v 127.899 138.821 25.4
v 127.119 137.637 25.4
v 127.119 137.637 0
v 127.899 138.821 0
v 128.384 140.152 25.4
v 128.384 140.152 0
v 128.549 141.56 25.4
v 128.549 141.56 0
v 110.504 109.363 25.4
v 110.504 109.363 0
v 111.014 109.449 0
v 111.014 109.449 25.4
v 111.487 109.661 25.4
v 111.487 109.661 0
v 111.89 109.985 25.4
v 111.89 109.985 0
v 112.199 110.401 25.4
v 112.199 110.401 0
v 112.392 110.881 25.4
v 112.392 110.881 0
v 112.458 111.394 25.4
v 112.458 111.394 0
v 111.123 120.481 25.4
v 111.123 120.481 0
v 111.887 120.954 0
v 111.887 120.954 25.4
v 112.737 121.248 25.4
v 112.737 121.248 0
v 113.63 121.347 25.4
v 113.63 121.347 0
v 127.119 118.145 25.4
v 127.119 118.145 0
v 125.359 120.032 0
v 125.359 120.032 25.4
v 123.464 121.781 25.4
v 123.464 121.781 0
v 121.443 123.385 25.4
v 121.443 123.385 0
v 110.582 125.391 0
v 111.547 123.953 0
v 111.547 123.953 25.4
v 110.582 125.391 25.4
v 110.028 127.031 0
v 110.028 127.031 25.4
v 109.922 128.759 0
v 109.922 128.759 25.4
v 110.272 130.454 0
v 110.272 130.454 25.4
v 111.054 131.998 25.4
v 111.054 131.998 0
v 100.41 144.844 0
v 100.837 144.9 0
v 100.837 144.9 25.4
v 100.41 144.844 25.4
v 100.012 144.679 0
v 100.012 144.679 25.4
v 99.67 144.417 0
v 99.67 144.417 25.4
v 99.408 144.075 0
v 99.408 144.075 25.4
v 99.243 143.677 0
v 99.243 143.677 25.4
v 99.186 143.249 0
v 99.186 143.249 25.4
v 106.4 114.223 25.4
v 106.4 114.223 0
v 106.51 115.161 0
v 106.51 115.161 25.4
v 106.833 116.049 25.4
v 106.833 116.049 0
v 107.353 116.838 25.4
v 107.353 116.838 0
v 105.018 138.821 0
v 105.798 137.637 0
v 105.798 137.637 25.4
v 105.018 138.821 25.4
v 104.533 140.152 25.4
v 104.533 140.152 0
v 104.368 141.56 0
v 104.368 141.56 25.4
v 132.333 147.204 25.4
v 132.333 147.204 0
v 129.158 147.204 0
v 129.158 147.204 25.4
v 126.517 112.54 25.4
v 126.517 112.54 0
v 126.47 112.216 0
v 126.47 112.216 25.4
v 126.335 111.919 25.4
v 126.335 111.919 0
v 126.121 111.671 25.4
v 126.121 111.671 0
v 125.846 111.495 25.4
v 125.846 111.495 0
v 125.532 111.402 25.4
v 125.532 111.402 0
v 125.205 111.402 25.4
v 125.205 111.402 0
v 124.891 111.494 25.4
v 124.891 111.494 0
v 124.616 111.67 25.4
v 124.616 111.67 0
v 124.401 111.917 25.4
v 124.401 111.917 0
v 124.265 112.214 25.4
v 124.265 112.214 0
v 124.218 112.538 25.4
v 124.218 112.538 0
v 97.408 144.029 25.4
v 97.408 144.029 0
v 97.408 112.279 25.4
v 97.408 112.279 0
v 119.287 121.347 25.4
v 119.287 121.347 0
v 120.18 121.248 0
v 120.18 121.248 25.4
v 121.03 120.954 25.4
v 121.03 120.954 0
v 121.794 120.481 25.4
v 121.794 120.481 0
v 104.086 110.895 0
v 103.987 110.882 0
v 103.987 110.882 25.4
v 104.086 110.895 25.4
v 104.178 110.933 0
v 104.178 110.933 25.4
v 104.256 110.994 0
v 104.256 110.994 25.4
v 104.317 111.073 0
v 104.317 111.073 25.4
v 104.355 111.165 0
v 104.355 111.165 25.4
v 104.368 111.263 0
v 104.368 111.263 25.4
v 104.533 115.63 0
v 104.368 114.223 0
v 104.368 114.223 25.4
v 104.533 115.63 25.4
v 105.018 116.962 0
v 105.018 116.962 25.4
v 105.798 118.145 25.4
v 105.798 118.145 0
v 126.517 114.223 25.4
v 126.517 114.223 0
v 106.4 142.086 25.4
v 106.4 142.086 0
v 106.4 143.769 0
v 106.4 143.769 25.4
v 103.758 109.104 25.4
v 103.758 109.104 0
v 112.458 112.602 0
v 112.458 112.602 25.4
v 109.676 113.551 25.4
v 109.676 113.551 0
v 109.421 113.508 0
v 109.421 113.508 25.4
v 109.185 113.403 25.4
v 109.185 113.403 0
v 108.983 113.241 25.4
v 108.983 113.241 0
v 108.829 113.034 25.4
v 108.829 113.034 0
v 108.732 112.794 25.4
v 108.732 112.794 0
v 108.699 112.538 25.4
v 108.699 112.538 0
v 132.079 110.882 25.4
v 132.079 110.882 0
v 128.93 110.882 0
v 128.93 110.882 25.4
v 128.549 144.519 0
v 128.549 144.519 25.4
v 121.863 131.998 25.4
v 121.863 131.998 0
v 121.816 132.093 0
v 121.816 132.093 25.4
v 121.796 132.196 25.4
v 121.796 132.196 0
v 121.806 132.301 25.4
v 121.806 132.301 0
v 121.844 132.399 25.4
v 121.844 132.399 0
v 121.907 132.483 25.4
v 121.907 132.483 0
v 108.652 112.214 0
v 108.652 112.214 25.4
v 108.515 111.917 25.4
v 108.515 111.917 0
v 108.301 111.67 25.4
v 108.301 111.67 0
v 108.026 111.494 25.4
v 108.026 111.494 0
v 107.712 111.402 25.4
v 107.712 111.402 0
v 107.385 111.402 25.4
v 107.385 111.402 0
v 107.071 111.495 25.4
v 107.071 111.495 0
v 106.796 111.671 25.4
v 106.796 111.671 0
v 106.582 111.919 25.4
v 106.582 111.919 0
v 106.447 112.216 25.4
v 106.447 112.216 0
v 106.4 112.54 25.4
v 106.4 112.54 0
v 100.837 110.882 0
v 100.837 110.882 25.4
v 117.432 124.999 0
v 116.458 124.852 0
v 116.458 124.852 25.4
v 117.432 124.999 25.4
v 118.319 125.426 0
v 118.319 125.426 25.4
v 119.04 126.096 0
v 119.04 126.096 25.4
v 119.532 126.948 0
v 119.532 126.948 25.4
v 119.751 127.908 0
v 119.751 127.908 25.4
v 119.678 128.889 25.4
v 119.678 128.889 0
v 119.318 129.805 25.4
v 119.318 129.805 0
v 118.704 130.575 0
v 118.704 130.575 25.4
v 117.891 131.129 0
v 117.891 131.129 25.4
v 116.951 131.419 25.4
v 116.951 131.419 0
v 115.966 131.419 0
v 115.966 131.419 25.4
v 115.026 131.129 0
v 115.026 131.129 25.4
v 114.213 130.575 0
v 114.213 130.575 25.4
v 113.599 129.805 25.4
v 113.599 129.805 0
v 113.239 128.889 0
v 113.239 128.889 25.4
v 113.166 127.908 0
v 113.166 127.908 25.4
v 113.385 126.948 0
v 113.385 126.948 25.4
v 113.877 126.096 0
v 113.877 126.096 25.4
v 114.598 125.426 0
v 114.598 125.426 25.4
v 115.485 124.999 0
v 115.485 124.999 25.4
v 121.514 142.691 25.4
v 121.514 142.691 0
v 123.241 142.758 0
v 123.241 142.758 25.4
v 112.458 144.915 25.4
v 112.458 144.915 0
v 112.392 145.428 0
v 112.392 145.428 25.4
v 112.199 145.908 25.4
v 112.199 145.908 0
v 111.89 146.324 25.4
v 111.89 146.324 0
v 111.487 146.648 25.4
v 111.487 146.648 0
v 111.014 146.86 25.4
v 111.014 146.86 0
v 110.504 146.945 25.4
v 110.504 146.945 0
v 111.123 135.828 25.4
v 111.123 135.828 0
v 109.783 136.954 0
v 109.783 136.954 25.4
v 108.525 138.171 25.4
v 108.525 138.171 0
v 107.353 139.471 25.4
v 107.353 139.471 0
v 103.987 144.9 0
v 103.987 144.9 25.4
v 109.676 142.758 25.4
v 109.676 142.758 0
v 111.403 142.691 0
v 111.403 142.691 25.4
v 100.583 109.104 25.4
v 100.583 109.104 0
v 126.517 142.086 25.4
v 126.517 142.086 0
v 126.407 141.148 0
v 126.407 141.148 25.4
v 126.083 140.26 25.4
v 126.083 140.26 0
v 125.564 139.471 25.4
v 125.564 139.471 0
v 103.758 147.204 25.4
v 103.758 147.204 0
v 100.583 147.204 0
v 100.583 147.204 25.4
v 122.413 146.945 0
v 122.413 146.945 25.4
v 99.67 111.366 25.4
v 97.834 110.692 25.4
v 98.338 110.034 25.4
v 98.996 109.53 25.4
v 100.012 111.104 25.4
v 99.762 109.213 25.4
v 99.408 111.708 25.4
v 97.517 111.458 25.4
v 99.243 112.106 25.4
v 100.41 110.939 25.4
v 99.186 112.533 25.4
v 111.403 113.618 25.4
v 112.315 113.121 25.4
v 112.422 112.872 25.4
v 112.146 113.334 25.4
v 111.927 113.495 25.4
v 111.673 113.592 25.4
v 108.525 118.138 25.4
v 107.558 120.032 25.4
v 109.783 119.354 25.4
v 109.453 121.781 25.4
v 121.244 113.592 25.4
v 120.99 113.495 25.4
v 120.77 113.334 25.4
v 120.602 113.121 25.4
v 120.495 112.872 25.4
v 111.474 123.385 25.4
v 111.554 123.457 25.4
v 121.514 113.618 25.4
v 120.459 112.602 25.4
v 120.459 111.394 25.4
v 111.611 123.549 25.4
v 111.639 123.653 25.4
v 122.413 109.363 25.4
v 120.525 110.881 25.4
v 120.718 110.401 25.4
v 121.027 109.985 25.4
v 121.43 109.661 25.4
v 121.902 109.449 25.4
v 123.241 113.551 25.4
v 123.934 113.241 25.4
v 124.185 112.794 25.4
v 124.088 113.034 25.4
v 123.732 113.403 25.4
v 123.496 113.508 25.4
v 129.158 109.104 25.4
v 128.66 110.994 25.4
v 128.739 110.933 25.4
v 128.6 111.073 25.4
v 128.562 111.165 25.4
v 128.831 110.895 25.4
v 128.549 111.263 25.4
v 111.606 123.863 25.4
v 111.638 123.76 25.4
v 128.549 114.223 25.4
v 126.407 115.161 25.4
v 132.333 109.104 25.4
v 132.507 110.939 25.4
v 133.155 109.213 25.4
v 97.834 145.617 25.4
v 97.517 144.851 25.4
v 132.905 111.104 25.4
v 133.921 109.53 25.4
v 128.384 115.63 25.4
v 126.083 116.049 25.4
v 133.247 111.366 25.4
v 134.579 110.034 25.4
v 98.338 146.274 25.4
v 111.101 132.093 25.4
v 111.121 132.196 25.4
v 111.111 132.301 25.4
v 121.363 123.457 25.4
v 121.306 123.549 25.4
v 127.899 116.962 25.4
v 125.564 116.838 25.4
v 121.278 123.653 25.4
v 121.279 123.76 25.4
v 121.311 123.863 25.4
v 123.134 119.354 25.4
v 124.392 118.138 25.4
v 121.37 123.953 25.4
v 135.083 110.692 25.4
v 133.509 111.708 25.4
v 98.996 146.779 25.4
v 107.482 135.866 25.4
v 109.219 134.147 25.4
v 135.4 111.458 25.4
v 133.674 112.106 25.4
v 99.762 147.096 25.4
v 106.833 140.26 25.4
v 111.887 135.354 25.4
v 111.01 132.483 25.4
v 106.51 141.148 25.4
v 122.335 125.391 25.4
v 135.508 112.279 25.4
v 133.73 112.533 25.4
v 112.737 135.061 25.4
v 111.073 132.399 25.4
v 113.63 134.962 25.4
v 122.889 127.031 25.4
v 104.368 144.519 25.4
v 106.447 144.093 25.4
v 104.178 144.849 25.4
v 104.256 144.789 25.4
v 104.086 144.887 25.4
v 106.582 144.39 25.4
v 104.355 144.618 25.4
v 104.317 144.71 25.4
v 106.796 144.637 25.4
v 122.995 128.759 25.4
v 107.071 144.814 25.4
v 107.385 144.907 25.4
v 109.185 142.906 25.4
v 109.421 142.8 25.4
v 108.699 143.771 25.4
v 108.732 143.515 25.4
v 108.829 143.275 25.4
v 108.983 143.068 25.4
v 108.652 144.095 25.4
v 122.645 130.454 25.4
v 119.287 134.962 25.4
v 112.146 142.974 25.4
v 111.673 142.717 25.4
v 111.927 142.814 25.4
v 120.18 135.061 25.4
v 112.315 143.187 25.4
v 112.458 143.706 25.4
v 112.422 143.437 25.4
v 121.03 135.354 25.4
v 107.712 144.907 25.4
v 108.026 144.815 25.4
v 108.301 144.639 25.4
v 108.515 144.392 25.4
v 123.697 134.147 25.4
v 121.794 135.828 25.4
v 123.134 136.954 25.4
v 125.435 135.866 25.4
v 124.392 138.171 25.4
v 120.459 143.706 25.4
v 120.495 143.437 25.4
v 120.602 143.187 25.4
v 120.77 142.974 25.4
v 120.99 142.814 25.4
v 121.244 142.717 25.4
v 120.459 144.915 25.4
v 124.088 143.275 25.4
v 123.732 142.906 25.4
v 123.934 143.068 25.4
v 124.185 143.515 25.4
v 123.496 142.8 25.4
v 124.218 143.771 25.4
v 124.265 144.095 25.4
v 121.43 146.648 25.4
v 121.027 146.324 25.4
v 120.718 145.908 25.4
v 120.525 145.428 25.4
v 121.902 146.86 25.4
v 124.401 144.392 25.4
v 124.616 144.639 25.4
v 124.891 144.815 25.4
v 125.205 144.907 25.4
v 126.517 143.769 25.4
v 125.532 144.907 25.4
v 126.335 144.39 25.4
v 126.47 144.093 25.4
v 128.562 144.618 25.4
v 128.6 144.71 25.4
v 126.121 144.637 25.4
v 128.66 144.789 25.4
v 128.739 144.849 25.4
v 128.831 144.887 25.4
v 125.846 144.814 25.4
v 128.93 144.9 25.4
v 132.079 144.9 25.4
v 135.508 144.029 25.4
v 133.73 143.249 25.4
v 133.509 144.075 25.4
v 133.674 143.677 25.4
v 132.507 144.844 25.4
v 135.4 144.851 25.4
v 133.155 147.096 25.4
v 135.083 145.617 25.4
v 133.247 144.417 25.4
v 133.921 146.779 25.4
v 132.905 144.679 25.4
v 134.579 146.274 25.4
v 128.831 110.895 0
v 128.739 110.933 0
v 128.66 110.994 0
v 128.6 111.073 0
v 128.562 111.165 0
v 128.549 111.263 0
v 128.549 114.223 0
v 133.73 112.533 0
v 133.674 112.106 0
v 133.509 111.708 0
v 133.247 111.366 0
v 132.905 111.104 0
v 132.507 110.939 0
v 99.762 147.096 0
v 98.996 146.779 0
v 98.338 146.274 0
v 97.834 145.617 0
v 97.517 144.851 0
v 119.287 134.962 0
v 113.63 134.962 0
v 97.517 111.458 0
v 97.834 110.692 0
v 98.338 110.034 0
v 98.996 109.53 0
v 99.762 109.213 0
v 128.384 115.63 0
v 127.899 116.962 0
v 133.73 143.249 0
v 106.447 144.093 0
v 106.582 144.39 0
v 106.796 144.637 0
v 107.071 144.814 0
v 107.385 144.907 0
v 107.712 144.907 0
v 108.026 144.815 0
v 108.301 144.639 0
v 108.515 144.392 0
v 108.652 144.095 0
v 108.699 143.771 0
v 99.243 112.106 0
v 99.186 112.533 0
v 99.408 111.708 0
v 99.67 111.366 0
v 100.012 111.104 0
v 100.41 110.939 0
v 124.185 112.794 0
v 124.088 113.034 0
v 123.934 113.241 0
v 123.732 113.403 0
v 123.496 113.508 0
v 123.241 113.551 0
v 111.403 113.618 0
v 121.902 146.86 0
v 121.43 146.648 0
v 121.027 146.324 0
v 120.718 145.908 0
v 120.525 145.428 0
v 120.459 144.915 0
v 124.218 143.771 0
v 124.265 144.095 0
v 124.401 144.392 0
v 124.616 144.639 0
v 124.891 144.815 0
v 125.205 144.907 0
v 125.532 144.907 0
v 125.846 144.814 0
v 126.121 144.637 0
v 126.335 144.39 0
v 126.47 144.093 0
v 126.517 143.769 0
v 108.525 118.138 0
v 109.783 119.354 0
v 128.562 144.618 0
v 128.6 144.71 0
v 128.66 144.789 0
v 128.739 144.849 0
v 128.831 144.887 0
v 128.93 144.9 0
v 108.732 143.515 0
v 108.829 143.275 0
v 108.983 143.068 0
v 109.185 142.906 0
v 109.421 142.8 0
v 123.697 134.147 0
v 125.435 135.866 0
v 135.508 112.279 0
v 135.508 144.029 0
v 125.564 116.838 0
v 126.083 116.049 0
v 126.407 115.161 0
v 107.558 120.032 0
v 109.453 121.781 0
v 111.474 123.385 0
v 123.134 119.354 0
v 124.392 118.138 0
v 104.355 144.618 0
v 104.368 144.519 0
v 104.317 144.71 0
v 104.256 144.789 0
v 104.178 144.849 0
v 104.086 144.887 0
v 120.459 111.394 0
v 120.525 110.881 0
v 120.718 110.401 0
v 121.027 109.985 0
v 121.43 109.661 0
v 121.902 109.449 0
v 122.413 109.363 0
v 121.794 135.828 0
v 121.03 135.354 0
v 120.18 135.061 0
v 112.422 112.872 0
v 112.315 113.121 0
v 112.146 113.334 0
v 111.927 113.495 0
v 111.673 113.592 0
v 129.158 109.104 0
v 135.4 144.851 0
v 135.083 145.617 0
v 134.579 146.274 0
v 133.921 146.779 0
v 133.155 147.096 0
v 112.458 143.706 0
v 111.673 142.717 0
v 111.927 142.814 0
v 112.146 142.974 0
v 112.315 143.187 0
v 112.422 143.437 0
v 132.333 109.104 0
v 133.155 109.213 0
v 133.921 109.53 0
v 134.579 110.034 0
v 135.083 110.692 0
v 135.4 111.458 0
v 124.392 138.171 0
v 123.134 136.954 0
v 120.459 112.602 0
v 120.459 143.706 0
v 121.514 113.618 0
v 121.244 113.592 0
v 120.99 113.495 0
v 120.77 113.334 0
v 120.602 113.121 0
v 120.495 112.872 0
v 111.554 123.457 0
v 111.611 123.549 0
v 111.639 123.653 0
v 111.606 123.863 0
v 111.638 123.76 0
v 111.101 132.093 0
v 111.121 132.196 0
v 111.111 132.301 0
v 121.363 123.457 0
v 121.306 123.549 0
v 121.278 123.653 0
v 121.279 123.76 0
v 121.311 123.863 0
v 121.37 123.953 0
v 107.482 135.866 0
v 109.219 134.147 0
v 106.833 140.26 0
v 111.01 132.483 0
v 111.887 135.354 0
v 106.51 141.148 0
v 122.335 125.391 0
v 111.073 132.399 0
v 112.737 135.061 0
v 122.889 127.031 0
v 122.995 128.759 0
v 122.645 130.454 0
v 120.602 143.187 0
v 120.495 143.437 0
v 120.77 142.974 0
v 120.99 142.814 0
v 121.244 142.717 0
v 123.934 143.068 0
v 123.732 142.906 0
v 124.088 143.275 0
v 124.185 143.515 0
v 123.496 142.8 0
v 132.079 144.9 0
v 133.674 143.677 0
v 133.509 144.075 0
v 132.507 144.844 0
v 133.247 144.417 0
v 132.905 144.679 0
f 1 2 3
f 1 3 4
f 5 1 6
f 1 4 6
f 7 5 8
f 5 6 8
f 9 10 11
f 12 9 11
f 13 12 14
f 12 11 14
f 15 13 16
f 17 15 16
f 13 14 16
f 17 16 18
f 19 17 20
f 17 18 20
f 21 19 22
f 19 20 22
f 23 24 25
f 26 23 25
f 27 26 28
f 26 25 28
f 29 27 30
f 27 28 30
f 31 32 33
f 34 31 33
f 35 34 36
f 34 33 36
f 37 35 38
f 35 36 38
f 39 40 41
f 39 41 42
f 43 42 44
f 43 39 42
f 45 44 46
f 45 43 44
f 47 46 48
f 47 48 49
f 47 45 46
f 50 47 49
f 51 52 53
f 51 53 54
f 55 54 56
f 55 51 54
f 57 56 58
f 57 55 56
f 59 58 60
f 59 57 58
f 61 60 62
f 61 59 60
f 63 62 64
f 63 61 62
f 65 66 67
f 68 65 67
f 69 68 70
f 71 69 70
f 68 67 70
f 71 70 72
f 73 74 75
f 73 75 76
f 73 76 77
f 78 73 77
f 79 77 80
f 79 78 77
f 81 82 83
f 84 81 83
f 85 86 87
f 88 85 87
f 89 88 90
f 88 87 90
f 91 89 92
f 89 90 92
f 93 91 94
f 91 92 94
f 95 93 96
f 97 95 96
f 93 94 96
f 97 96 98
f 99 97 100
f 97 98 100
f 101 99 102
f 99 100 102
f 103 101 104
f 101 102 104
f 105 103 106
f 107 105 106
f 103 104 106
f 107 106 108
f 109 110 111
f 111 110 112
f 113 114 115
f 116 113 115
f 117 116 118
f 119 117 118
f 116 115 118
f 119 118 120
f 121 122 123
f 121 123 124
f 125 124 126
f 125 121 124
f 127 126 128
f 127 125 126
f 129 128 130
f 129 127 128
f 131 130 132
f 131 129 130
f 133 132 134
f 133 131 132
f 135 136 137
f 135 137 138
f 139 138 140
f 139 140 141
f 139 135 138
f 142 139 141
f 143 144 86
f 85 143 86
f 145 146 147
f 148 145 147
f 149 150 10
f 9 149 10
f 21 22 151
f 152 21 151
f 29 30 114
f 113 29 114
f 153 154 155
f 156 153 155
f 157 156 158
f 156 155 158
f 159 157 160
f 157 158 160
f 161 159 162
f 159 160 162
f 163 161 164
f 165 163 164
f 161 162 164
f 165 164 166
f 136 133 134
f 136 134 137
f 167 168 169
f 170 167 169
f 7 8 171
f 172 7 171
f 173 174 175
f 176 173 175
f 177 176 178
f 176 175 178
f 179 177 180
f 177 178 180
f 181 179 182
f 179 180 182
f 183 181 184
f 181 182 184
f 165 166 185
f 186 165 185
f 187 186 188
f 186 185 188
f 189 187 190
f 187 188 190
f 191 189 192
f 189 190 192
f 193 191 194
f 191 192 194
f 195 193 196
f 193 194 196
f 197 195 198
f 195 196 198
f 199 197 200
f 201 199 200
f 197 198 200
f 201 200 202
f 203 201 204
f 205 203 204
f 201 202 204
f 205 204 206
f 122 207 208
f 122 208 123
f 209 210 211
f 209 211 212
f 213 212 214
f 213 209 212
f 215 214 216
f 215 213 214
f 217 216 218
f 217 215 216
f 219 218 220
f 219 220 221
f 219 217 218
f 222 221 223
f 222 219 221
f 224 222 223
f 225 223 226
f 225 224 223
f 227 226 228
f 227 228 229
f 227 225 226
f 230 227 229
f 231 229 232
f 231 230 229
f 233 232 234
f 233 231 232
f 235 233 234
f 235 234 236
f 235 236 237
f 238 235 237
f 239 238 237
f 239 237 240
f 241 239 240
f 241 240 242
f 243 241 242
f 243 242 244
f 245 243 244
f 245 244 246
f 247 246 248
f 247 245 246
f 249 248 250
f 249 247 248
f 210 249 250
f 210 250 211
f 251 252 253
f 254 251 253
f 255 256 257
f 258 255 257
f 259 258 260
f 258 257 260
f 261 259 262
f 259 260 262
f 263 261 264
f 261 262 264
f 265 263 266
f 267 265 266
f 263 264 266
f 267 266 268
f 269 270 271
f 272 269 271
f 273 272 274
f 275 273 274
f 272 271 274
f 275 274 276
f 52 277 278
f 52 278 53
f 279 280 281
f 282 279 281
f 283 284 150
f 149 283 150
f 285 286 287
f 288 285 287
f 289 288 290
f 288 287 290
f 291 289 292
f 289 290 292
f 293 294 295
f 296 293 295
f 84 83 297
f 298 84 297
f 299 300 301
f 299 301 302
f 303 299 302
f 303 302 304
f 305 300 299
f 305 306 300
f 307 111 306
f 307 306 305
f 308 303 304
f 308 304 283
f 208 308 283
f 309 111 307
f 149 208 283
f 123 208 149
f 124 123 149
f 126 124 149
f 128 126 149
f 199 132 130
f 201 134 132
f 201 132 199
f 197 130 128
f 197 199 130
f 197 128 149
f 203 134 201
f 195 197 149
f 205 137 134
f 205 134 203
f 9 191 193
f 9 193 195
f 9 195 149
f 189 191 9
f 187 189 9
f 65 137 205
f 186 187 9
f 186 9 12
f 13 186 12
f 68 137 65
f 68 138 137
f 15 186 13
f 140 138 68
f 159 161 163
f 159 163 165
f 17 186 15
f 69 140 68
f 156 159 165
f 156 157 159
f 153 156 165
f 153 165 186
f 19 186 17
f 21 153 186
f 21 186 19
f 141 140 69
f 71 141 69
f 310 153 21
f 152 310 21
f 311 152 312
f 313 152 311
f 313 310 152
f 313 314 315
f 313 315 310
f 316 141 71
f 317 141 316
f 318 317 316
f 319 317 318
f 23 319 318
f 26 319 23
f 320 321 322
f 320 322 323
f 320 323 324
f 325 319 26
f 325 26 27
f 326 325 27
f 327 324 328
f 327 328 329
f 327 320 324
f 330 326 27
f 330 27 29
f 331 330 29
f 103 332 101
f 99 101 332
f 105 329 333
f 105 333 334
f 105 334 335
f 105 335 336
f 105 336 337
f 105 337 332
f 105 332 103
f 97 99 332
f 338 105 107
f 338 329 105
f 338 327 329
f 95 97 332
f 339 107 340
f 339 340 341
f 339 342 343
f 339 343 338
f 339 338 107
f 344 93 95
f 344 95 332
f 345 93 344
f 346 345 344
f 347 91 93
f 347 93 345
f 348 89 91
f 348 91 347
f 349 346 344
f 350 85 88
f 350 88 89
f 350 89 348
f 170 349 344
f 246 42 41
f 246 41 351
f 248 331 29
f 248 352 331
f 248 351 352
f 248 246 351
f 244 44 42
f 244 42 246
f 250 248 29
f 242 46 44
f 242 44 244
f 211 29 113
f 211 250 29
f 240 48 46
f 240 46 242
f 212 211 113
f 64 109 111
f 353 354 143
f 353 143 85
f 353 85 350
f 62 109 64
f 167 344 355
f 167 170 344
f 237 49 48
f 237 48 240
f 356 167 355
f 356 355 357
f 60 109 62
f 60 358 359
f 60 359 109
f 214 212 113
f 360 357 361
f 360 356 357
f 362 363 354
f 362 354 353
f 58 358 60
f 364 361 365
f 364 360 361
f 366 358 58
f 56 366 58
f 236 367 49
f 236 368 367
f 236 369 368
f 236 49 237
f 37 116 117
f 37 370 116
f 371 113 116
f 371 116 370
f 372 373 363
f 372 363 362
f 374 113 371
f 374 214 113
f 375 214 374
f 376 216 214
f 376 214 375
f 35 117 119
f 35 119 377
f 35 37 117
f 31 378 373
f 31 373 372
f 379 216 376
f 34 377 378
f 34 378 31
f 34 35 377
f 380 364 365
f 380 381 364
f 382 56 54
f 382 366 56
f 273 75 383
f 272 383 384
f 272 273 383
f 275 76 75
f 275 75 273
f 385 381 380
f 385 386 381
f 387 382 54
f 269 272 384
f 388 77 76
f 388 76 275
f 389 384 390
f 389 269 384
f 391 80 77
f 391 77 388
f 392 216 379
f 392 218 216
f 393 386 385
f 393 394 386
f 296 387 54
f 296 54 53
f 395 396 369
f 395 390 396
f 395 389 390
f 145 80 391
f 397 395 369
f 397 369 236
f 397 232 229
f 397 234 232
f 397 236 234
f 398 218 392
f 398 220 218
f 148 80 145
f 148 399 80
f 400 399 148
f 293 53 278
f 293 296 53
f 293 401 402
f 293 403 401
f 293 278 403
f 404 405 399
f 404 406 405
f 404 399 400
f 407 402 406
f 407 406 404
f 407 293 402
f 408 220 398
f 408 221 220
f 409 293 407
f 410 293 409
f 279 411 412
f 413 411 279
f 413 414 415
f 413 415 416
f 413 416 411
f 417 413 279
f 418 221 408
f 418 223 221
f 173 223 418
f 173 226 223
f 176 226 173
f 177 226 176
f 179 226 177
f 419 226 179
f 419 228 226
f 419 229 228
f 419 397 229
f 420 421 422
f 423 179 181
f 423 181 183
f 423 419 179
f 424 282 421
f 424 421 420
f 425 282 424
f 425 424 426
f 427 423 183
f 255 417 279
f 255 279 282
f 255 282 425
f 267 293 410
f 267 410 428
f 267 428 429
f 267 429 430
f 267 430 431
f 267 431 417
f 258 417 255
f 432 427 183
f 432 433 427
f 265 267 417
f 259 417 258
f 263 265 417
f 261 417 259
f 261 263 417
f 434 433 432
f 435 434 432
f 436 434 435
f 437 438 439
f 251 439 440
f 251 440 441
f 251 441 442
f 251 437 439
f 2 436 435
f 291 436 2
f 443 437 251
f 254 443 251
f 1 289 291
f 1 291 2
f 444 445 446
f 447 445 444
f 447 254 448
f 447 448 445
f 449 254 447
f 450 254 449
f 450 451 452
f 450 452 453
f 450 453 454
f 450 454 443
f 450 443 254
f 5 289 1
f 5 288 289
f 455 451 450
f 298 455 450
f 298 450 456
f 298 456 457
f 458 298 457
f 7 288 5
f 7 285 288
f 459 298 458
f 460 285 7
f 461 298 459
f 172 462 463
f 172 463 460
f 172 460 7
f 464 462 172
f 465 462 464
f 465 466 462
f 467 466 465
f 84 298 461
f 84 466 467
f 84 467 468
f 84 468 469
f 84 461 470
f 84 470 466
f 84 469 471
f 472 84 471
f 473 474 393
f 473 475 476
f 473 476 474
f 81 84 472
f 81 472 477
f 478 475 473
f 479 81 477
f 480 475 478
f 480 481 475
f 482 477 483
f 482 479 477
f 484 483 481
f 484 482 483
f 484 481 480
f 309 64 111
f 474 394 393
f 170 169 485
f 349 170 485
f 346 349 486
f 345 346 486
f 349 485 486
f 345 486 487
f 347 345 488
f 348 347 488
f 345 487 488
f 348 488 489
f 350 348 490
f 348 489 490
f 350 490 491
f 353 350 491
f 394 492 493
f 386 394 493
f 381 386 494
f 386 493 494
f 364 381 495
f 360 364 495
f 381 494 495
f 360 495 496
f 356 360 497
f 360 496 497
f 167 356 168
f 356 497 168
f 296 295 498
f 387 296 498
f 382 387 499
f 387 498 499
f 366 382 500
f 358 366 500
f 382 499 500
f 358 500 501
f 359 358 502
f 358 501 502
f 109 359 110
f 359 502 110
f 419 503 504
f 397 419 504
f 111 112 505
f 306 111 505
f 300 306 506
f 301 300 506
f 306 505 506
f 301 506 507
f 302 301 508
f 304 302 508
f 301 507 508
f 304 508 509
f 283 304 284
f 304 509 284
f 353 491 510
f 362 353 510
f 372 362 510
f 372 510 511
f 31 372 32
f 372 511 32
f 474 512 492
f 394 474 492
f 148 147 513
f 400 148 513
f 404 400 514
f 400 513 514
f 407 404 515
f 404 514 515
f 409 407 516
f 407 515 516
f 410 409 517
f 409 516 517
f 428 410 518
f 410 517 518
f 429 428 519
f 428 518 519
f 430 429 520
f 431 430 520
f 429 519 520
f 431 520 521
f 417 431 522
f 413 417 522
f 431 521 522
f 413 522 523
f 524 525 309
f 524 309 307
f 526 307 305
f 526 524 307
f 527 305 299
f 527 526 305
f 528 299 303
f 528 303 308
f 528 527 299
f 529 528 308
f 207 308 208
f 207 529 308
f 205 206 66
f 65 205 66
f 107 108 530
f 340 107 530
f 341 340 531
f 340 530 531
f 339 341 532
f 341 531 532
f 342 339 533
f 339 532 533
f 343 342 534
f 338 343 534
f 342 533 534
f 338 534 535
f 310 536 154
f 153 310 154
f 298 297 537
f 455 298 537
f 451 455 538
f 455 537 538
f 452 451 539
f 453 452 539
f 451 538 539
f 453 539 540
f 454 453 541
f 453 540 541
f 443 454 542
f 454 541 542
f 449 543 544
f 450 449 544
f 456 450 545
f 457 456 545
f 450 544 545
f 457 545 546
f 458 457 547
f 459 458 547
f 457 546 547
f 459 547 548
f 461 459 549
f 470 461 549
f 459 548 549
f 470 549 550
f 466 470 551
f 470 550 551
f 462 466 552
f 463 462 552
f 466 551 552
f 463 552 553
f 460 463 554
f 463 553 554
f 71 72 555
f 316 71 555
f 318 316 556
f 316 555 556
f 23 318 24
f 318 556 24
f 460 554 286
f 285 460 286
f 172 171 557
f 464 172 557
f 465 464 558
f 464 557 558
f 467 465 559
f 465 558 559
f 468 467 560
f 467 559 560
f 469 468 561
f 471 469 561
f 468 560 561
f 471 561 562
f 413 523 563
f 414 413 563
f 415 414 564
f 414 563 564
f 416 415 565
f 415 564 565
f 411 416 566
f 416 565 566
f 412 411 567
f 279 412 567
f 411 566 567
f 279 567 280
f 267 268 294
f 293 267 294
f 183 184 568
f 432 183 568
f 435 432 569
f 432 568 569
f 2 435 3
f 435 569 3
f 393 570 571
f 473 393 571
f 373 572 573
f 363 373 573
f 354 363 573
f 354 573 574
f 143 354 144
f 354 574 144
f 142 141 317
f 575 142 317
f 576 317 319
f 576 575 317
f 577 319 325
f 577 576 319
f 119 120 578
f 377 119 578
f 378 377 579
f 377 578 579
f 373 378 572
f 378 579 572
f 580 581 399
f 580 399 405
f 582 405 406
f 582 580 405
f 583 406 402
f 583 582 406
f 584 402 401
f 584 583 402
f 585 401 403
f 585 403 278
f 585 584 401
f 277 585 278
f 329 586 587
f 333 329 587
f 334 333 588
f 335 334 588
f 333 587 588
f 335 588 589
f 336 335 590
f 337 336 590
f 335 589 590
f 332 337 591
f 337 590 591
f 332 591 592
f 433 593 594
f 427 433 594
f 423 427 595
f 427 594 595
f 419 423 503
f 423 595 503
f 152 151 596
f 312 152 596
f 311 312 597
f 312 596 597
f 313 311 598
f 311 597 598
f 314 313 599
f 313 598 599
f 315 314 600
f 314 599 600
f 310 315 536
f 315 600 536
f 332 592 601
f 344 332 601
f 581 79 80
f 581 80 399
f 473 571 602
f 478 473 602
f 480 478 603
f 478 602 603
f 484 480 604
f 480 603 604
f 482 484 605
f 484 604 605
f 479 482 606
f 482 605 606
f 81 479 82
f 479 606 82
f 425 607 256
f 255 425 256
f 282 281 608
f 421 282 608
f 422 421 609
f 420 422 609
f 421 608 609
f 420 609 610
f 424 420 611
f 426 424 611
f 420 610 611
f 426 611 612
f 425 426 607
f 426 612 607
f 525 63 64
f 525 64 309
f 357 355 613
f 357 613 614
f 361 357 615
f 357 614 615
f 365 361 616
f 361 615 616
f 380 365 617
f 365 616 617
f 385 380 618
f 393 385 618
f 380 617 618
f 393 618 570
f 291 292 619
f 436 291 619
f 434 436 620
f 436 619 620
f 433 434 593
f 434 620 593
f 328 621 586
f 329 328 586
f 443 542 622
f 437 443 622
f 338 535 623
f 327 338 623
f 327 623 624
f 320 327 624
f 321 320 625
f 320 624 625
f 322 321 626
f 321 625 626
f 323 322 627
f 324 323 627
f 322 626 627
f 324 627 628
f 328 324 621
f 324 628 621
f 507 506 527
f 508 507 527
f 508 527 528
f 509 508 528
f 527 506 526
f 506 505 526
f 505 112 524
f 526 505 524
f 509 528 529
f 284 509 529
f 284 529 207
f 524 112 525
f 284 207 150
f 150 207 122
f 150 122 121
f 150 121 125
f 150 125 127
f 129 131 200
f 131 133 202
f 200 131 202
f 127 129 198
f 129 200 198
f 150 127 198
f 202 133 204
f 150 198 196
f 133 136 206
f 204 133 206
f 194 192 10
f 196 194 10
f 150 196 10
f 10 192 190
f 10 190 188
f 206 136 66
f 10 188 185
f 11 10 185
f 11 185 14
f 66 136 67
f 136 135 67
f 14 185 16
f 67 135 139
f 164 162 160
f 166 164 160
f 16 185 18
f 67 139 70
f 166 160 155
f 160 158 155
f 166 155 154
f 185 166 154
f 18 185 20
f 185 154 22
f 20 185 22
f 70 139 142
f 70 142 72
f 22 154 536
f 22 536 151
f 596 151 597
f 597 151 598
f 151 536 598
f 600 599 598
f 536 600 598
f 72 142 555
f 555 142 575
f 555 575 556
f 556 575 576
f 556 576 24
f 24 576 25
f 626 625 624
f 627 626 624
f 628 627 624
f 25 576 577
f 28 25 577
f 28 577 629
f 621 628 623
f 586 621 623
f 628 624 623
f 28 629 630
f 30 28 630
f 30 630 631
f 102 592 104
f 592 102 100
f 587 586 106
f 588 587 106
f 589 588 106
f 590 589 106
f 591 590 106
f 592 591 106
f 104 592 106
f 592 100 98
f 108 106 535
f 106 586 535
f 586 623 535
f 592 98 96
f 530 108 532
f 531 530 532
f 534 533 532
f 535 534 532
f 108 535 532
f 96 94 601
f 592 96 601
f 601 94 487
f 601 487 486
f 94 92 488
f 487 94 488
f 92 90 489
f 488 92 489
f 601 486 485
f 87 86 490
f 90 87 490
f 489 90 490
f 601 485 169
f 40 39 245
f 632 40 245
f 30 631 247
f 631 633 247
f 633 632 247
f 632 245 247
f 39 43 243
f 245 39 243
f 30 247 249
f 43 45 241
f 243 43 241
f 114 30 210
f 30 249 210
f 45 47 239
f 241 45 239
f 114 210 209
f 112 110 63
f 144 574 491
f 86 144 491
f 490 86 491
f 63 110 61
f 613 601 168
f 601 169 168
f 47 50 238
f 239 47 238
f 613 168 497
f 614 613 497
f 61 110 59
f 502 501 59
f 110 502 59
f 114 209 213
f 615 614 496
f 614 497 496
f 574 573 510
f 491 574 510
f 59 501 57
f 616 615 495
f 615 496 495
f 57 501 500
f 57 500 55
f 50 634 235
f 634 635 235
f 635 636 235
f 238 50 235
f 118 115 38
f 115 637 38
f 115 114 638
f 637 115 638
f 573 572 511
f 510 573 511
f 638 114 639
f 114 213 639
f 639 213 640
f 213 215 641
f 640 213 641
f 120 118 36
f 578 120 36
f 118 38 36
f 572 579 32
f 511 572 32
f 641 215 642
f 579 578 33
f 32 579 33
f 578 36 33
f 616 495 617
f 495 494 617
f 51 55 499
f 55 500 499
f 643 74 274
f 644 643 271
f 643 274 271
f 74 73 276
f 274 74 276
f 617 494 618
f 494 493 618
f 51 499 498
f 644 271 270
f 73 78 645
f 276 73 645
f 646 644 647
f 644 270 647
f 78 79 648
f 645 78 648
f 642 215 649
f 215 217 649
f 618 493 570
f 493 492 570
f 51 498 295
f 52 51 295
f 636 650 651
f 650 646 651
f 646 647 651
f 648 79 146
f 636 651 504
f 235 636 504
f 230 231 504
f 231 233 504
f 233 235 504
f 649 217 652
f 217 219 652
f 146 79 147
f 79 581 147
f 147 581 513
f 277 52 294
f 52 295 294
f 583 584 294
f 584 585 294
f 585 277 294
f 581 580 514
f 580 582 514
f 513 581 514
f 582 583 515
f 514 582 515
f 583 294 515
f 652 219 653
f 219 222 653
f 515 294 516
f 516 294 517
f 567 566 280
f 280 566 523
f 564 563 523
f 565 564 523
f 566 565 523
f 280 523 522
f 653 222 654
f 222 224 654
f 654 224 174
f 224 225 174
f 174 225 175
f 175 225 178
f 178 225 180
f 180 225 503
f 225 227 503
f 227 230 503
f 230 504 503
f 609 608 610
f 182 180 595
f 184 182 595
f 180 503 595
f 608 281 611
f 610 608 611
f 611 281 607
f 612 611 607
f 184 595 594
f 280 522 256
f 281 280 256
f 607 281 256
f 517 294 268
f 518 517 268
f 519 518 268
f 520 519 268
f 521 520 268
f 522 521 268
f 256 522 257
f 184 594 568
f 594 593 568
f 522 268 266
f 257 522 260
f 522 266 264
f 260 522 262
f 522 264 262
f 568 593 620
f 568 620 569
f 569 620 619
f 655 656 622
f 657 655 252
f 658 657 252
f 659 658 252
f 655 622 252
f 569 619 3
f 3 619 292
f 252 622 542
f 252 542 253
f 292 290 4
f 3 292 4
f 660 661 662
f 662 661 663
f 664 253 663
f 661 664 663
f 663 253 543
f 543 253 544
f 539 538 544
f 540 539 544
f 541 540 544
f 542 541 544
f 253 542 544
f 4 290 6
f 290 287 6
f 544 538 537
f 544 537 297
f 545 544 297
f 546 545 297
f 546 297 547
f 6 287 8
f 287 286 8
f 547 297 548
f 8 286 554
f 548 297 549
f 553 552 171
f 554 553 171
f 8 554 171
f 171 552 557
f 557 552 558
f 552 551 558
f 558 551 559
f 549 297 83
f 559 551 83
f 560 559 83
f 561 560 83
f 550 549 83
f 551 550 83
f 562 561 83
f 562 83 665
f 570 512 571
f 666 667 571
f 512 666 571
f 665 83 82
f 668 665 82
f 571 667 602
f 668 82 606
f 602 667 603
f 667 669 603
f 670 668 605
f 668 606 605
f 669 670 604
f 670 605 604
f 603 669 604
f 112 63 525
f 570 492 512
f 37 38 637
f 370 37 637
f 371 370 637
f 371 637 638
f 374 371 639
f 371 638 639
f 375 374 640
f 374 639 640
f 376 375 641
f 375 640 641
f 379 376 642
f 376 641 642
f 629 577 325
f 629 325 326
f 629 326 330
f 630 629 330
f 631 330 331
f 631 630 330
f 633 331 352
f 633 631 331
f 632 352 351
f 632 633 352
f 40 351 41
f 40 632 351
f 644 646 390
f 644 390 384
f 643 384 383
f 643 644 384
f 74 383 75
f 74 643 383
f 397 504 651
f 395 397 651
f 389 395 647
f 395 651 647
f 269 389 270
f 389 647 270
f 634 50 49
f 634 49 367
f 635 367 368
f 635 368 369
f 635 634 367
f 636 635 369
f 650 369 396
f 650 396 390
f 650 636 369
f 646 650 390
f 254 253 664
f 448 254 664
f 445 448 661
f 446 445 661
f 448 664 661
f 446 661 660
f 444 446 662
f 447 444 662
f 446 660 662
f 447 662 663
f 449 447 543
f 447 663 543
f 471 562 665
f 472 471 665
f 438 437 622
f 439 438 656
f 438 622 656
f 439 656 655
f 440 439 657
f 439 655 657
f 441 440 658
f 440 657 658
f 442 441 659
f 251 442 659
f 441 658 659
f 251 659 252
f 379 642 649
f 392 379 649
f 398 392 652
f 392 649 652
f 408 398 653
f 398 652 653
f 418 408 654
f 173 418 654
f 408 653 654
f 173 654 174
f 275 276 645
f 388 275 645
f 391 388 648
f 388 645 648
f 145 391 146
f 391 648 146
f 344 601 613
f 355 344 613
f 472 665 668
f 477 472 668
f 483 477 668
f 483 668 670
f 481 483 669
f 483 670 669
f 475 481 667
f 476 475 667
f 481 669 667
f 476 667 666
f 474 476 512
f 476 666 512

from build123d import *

# Parameters (mm, degrees)
EXTRUDE1_DEPTH = 25.4


with BuildPart() as part:
    # Sketch1 → Extrude1 (new body)
    with BuildSketch(Plane.XY):
        with BuildLine():
            Line((119.286543537, 134.961539124), (116.458442746, 134.961539124))
            Line((116.458442746, 134.961539124), (113.630341955, 134.961539124))
            ThreePointArc((113.630341955, 134.961539124), (112.303785999, 135.184140252), (111.122551329, 135.827558172))
            ThreePointArc((111.122551329, 135.827558172), (109.143601343, 137.551745223), (107.353147508, 139.470947948))
            ThreePointArc((107.353147508, 139.470947948), (106.645746382, 140.694329655), (106.400042746, 142.085986537))
            Line((106.400042746, 142.085986537), (106.400042746, 143.768987481))
            ThreePointArc((106.400042746, 143.768987481), (107.548393057, 144.918338688), (108.698744289, 143.770990147))
            ThreePointArc((108.698744289, 143.770990147), (108.983276863, 143.067626667), (109.675740732, 142.757509334))
            Line((109.675740732, 142.757509334), (111.402940732, 142.691157003))
            ThreePointArc((111.402940732, 142.691157003), (112.146439004, 142.974328196), (112.457942746, 143.706408126))
            Line((112.457942746, 143.706408126), (112.457942746, 144.914700752))
            ThreePointArc((112.457942746, 144.914700752), (111.890102605, 146.323693267), (110.503946774, 146.945202999))
            Line((110.503946774, 146.945202999), (103.758442746, 147.204339124))
            Line((103.758442746, 147.204339124), (100.583442746, 147.204339124))
            ThreePointArc((100.583442746, 147.204339124), (98.338378716, 146.274403155), (97.408442746, 144.029339124))
            Line((97.408442746, 144.029339124), (97.408442746, 112.279339124))
            ThreePointArc((97.408442746, 112.279339124), (98.338378716, 110.034275094), (100.583442746, 109.104339124))
            Line((100.583442746, 109.104339124), (103.758442746, 109.104339124))
            Line((103.758442746, 109.104339124), (110.503946774, 109.36347525))
            ThreePointArc((110.503946774, 109.36347525), (111.890102605, 109.984984981), (112.457942746, 111.393977496))
            Line((112.457942746, 111.393977496), (112.457942746, 112.602270123))
            ThreePointArc((112.457942746, 112.602270123), (112.146439004, 113.334350053), (111.402940732, 113.617521246))
            Line((111.402940732, 113.617521246), (109.675740732, 113.551168915))
            ThreePointArc((109.675740732, 113.551168915), (108.983276863, 113.241051582), (108.698744289, 112.537688102))
            ThreePointArc((108.698744289, 112.537688102), (107.548393057, 111.390339561), (106.400042746, 112.539690768))
            Line((106.400042746, 112.539690768), (106.400042746, 114.222691712))
            ThreePointArc((106.400042746, 114.222691712), (106.645746382, 115.614348594), (107.353147508, 116.8377303))
            ThreePointArc((107.353147508, 116.8377303), (109.143601343, 118.756933026), (111.122551329, 120.481120077))
            ThreePointArc((111.122551329, 120.481120077), (112.303785999, 121.124537997), (113.630341955, 121.347139124))
            Line((113.630341955, 121.347139124), (116.458442746, 121.347139124))
            Line((116.458442746, 121.347139124), (119.286543537, 121.347139124))
            ThreePointArc((119.286543537, 121.347139124), (120.613099494, 121.124537997), (121.794334164, 120.481120077))
            ThreePointArc((121.794334164, 120.481120077), (123.77328415, 118.756933026), (125.563737985, 116.8377303))
            ThreePointArc((125.563737985, 116.8377303), (126.27113911, 115.614348594), (126.516842746, 114.222691712))
            Line((126.516842746, 114.222691712), (126.516842746, 112.539690768))
            ThreePointArc((126.516842746, 112.539690768), (125.368492436, 111.390339561), (124.218141204, 112.537688102))
            ThreePointArc((124.218141204, 112.537688102), (123.93360863, 113.241051582), (123.24114476, 113.551168915))
            Line((123.24114476, 113.551168915), (121.51394476, 113.617521246))
            ThreePointArc((121.51394476, 113.617521246), (120.770446489, 113.334350053), (120.458942746, 112.602270123))
            Line((120.458942746, 112.602270123), (120.458942746, 111.393977496))
            ThreePointArc((120.458942746, 111.393977496), (121.026782887, 109.984984981), (122.412938718, 109.36347525))
            Line((122.412938718, 109.36347525), (129.158442746, 109.104339124))
            Line((129.158442746, 109.104339124), (132.333442746, 109.104339124))
            ThreePointArc((132.333442746, 109.104339124), (134.578506777, 110.034275094), (135.508442746, 112.279339124))
            Line((135.508442746, 112.279339124), (135.508442746, 144.029339124))
            ThreePointArc((135.508442746, 144.029339124), (134.578506777, 146.274403155), (132.333442746, 147.204339124))
            Line((132.333442746, 147.204339124), (129.158442746, 147.204339124))
            Line((129.158442746, 147.204339124), (122.412938718, 146.945202999))
            ThreePointArc((122.412938718, 146.945202999), (121.026782887, 146.323693267), (120.458942746, 144.914700752))
            Line((120.458942746, 144.914700752), (120.458942746, 143.706408126))
            ThreePointArc((120.458942746, 143.706408126), (120.770446489, 142.974328196), (121.51394476, 142.691157003))
            Line((121.51394476, 142.691157003), (123.24114476, 142.757509334))
            ThreePointArc((123.24114476, 142.757509334), (123.93360863, 143.067626667), (124.218141204, 143.770990147))
            ThreePointArc((124.218141204, 143.770990147), (125.368492436, 144.918338688), (126.516842746, 143.768987481))
            Line((126.516842746, 143.768987481), (126.516842746, 142.085986537))
            ThreePointArc((126.516842746, 142.085986537), (126.27113911, 140.694329655), (125.563737985, 139.470947948))
            ThreePointArc((125.563737985, 139.470947948), (123.77328415, 137.551745223), (121.794334164, 135.827558172))
            ThreePointArc((121.794334164, 135.827558172), (120.613099494, 135.184140252), (119.286543537, 134.961539124))
        make_face()
        with BuildLine():
            Line((128.548842746, 141.559935312), (128.548842746, 144.5192879))
            ThreePointArc((128.548842746, 144.5192879), (128.660435063, 144.788695584), (128.929842746, 144.9002879))
            Line((128.929842746, 144.9002879), (132.079442746, 144.9002879))
            ThreePointArc((132.079442746, 144.9002879), (133.246876042, 144.416721196), (133.730442746, 143.2492879))
            Line((133.730442746, 143.2492879), (133.730442746, 112.533339124))
            ThreePointArc((133.730442746, 112.533339124), (133.246876042, 111.365905829), (132.079442746, 110.882339124))
            Line((132.079442746, 110.882339124), (128.929842746, 110.882339124))
            ThreePointArc((128.929842746, 110.882339124), (128.660435063, 110.993931441), (128.548842746, 111.263339124))
            Line((128.548842746, 111.263339124), (128.548842746, 114.222691712))
            ThreePointArc((128.548842746, 114.222691712), (128.180287293, 116.310177035), (127.119185604, 118.145249594))
            ThreePointArc((127.119185604, 118.145249594), (124.427739509, 120.92409139), (121.44277505, 123.384951196))
            ThreePointArc((121.44277505, 123.384951196), (121.277666857, 123.652597781), (121.370025317, 123.953206039))
            ThreePointArc((121.370025317, 123.953206039), (122.999396104, 127.891050115), (121.862557266, 131.998246553))
            ThreePointArc((121.862557266, 131.998246553), (121.797364551, 132.248793719), (121.907342287, 132.483162808))
            ThreePointArc((121.907342287, 132.483162808), (124.57297323, 134.999893232), (127.119185604, 137.63737743))
            ThreePointArc((127.119185604, 137.63737743), (128.180287293, 139.47244999), (128.548842746, 141.559935312))
        make_face(mode=Mode.SUBTRACT)
        with BuildLine():
            Line((104.368042746, 141.559935312), (104.368042746, 144.5192879))
            ThreePointArc((104.368042746, 144.5192879), (104.25645043, 144.788695584), (103.987042746, 144.9002879))
            Line((103.987042746, 144.9002879), (100.837442746, 144.9002879))
            ThreePointArc((100.837442746, 144.9002879), (99.670009451, 144.416721196), (99.186442746, 143.2492879))
            Line((99.186442746, 143.2492879), (99.186442746, 112.533339124))
            ThreePointArc((99.186442746, 112.533339124), (99.670009451, 111.365905829), (100.837442746, 110.882339124))
            Line((100.837442746, 110.882339124), (103.987042746, 110.882339124))
            ThreePointArc((103.987042746, 110.882339124), (104.25645043, 110.993931441), (104.368042746, 111.263339124))
            Line((104.368042746, 111.263339124), (104.368042746, 114.222691712))
            ThreePointArc((104.368042746, 114.222691712), (104.7365982, 116.310177035), (105.797699889, 118.145249594))
            ThreePointArc((105.797699889, 118.145249594), (108.489145984, 120.92409139), (111.474110443, 123.384951196))
            ThreePointArc((111.474110443, 123.384951196), (111.639218636, 123.652597781), (111.546860176, 123.953206039))
            ThreePointArc((111.546860176, 123.953206039), (109.917489388, 127.891050115), (111.054328227, 131.998246553))
            ThreePointArc((111.054328227, 131.998246553), (111.119520942, 132.248793719), (111.009543206, 132.483162808))
            ThreePointArc((111.009543206, 132.483162808), (108.343912263, 134.999893232), (105.797699889, 137.63737743))
            ThreePointArc((105.797699889, 137.63737743), (104.7365982, 139.47244999), (104.368042746, 141.559935312))
        make_face(mode=Mode.SUBTRACT)
        with BuildLine():
            ThreePointArc((116.458442746, 131.456339124), (113.156442746, 128.154339124), (116.458442746, 124.852339124))
            ThreePointArc((116.458442746, 124.852339124), (119.760442746, 128.154339124), (116.458442746, 131.456339124))
        make_face(mode=Mode.SUBTRACT)
    extrude(amount=EXTRUDE1_DEPTH)


solid = part.part
